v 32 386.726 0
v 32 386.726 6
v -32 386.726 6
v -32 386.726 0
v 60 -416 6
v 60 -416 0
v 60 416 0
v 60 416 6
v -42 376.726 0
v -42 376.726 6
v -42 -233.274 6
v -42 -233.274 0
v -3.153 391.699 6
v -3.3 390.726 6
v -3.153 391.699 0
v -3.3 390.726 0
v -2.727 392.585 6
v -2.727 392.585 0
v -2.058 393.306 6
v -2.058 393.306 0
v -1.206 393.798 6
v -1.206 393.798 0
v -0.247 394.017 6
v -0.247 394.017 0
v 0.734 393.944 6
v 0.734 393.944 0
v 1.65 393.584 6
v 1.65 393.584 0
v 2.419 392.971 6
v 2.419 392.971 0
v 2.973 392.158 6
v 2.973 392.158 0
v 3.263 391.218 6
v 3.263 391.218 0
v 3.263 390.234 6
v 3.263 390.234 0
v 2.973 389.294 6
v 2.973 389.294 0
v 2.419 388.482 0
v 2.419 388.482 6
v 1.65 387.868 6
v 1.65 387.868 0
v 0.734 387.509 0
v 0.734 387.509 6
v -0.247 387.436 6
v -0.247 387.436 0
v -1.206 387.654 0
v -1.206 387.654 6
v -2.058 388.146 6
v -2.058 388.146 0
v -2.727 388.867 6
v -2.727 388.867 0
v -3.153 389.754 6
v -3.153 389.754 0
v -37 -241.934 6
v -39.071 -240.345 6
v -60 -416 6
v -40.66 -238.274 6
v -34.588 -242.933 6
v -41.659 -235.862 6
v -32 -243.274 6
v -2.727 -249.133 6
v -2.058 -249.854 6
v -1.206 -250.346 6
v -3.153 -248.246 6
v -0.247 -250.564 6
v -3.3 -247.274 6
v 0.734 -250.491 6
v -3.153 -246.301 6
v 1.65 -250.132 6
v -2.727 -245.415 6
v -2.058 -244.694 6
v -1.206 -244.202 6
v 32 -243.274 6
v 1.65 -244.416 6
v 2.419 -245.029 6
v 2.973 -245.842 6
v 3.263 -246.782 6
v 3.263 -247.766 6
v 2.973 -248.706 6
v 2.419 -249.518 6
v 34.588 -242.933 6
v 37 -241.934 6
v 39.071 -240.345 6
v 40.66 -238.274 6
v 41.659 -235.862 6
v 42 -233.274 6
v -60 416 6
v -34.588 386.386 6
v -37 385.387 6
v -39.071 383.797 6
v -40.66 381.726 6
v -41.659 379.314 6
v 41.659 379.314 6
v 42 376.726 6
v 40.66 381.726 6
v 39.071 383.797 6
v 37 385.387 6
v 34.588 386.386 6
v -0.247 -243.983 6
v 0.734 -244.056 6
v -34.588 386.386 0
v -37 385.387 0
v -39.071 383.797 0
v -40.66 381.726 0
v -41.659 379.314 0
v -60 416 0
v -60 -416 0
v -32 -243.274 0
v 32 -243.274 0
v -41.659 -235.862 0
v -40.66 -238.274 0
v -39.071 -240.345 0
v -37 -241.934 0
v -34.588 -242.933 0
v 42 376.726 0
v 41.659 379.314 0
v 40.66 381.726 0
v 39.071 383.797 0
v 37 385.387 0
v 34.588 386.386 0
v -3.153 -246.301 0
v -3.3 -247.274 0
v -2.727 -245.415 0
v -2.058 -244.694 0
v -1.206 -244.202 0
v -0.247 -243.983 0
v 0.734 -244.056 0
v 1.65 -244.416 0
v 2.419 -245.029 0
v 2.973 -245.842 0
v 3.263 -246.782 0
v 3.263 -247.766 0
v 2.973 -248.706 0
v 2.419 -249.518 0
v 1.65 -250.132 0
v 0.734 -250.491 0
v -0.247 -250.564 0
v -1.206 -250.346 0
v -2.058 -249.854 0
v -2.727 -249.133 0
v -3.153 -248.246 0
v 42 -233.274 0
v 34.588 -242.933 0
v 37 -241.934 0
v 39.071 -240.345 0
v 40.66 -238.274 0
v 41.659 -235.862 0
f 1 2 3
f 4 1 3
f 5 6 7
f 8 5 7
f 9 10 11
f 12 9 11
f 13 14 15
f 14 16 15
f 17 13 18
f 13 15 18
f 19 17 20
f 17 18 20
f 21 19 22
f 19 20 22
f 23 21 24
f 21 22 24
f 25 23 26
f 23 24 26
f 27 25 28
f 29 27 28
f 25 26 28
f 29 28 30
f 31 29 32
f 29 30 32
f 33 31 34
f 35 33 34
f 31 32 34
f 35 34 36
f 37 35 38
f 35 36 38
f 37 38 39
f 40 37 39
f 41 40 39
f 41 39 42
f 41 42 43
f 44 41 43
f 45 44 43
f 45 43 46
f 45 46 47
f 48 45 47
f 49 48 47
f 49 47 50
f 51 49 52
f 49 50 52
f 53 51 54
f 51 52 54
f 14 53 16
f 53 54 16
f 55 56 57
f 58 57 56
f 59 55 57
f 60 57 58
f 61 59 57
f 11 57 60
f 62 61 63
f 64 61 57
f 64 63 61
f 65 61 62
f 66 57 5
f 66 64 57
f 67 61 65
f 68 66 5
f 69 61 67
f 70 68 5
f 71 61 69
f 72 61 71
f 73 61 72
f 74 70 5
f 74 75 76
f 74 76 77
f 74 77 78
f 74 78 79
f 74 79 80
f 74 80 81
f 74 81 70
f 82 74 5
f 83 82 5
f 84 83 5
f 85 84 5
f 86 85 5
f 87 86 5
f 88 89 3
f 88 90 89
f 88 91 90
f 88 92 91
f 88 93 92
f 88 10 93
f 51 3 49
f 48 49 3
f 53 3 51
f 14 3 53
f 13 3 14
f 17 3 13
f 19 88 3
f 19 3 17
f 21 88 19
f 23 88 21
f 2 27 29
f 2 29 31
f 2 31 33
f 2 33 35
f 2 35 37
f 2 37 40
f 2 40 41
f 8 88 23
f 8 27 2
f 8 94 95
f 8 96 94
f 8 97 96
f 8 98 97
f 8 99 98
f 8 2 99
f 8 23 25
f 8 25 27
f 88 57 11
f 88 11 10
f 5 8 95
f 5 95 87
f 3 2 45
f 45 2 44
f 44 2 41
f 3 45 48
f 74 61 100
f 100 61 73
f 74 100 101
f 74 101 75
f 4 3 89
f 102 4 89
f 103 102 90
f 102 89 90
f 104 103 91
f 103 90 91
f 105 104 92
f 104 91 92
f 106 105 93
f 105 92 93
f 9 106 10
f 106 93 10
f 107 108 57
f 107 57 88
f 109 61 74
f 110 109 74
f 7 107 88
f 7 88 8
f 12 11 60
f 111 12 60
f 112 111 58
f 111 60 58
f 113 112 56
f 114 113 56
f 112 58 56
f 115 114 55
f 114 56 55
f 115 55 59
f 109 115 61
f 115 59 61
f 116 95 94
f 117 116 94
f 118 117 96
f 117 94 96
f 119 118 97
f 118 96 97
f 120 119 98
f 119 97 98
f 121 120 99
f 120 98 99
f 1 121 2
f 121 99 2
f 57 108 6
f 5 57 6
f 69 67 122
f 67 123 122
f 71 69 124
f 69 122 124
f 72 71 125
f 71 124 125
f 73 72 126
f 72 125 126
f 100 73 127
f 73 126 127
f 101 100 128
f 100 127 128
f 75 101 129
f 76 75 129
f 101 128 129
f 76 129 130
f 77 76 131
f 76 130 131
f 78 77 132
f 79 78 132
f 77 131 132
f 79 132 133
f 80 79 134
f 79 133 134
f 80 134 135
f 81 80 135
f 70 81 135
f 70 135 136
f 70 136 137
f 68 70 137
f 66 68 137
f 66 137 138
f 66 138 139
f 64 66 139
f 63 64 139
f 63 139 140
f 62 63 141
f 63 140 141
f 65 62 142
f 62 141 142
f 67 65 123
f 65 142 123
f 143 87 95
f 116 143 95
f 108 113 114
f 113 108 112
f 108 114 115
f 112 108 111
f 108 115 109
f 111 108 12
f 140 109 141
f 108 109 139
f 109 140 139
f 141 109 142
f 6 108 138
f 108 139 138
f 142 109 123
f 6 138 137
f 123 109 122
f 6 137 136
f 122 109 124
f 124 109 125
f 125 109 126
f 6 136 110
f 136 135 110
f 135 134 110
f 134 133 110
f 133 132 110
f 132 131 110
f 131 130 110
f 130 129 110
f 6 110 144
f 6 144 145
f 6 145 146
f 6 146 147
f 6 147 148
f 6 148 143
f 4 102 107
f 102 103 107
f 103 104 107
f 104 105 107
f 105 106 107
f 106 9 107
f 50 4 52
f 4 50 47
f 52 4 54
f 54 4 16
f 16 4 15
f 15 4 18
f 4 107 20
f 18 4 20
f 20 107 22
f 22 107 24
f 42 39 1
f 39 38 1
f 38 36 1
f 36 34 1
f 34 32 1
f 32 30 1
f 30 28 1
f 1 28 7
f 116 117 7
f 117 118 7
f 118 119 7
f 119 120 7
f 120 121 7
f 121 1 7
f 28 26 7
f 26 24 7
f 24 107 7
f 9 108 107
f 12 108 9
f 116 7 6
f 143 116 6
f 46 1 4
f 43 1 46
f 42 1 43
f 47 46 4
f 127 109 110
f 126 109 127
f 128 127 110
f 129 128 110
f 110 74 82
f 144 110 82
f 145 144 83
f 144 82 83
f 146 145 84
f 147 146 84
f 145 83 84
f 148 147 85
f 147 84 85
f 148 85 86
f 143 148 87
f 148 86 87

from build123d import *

# Parameters (mm, degrees)
ESQUISSE1_W              = 120
ESQUISSE1_H              = 832
BOSS_EXTRU_1_DEPTH       = 6
CUT_EXTRUDE1_DEPTH       = 10
M6_CLEARANCE_HOLE1_D     = 6.6
M6_CLEARANCE_HOLE1_DEPTH = 6
M6_CLEARANCE_HOLE1_TIP   = 1.982840043


with BuildPart() as part:
    # Esquisse1 → Boss.-Extru.1 (new body)
    with BuildSketch(Plane.XY):
        Rectangle(ESQUISSE1_W, ESQUISSE1_H)
    extrude(amount=BOSS_EXTRU_1_DEPTH)

    # Sketch1 → Cut-Extrude1 (cut)
    with BuildSketch(Plane.XY.offset(6)):
        with BuildLine():
            Line((-42, 376.726304266), (-42, -233.273695734))
            ThreePointArc((-42, -233.273695734), (-39.071067812, -240.344763545), (-32, -243.273695734))
            Line((-32, -243.273695734), (32, -243.273695734))
            ThreePointArc((32, -243.273695734), (39.071067812, -240.344763545), (42, -233.273695734))
            Line((42, -233.273695734), (42, 376.726304266))
            ThreePointArc((42, 376.726304266), (39.071067812, 383.797372078), (32, 386.726304266))
            Line((32, 386.726304266), (-32, 386.726304266))
            ThreePointArc((-32, 386.726304266), (-39.071067812, 383.797372078), (-42, 376.726304266))
        make_face()
    extrude(amount=-CUT_EXTRUDE1_DEPTH, mode=Mode.SUBTRACT)

    # M6 Clearance Hole1
    with Locations(Plane.XY.offset(6)):
        with Locations((0, 390.726304266), (0, -247.273695734)):
            Hole(M6_CLEARANCE_HOLE1_D / 2, depth=M6_CLEARANCE_HOLE1_DEPTH)
            with Locations((0, 0, -(M6_CLEARANCE_HOLE1_DEPTH + M6_CLEARANCE_HOLE1_TIP / 2))):  # 118° drill point
                Cone(0, M6_CLEARANCE_HOLE1_D / 2, M6_CLEARANCE_HOLE1_TIP, mode=Mode.SUBTRACT)


solid = part.part
